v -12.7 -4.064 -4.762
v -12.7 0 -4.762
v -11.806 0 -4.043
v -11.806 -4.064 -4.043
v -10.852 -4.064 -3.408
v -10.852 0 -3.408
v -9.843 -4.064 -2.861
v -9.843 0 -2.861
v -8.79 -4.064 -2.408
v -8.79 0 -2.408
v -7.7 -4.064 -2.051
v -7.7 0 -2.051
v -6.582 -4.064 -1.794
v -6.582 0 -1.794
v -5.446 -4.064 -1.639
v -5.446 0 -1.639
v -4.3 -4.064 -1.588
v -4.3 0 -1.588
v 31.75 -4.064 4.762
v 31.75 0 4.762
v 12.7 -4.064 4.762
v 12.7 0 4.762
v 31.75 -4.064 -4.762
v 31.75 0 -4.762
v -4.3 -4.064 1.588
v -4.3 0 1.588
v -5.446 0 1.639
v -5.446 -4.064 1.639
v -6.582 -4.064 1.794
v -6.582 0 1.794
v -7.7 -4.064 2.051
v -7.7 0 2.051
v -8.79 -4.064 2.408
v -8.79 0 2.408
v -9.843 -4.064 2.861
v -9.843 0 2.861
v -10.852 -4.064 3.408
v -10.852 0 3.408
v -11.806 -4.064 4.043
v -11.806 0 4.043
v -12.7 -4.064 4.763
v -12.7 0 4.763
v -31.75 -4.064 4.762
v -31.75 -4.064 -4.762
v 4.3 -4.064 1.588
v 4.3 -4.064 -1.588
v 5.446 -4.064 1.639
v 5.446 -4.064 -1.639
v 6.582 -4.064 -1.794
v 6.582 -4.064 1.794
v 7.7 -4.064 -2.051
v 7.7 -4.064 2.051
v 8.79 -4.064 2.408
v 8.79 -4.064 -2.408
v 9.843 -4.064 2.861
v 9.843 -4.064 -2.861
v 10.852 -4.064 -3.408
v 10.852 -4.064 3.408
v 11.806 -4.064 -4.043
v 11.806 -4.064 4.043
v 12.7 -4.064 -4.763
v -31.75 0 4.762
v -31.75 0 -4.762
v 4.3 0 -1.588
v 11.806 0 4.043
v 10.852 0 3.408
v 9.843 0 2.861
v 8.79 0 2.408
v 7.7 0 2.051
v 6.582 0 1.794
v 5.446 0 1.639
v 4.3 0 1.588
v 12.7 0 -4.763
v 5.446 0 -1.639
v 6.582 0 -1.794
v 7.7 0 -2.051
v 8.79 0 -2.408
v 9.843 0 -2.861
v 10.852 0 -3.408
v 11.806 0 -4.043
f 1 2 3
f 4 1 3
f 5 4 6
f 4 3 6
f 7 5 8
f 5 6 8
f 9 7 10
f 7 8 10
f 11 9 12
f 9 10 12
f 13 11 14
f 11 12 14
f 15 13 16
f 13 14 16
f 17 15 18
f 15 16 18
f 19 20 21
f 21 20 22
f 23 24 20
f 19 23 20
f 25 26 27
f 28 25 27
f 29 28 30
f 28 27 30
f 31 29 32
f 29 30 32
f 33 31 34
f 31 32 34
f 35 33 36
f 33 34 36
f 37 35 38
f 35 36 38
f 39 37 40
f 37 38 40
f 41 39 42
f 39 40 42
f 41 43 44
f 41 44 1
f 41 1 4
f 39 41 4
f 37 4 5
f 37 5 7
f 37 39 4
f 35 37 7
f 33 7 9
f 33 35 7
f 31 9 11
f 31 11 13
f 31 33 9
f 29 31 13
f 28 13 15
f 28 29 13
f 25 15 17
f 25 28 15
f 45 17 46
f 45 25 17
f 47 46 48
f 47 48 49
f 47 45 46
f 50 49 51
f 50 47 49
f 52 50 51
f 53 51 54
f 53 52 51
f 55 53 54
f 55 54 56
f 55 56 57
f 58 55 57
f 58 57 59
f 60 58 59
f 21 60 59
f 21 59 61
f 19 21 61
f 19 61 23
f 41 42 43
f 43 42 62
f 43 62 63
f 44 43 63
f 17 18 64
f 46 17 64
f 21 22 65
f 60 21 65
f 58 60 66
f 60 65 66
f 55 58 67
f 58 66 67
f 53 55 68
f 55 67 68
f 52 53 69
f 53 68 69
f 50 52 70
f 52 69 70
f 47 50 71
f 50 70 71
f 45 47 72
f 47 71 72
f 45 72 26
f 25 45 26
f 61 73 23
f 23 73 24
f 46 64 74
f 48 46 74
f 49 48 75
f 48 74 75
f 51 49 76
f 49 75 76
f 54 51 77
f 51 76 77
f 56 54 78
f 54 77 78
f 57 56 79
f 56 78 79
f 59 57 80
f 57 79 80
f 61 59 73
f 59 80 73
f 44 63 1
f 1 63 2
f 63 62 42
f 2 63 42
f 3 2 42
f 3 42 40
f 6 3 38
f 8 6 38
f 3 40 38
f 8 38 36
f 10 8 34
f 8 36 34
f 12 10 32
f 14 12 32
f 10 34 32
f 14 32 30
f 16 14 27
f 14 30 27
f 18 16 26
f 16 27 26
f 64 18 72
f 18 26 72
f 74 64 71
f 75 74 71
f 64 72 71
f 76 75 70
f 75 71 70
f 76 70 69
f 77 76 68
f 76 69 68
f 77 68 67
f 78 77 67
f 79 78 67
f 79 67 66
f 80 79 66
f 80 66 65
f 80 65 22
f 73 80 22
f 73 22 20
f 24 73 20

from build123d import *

# Parameters (mm, degrees)
F1_DEPTH = 4.064


with BuildPart() as f1:
    # F0 (on Front) → F1 (new body)
    with BuildSketch(Plane.XZ):
        with BuildLine():
            Line((4.29974, 1.5875), (0, 1.5875))
            Line((0, 1.5875), (-4.29974, 1.5875))
            ThreePointArc((-4.29974, 1.5875), (-8.789868, 2.407738), (-12.7, 4.7625))
            Line((-12.7, 4.7625), (-31.75, 4.7625))
            Line((-31.75, 4.7625), (-31.75, 0))
            Line((-31.75, 0), (-31.75, -4.7625))
            Line((-31.75, -4.7625), (-12.7, -4.7625))
            ThreePointArc((-12.7, -4.7625), (-8.789868, -2.407738), (-4.29974, -1.5875))
            Line((-4.29974, -1.5875), (0, -1.5875))
            Line((0, -1.5875), (4.29974, -1.5875))
            ThreePointArc((4.29974, -1.5875), (8.789868, -2.407738), (12.7, -4.7625))
            Line((12.7, -4.7625), (31.75, -4.7625))
            Line((31.75, -4.7625), (31.75, 0))
            Line((31.75, 0), (31.75, 4.7625))
            Line((31.75, 4.7625), (12.7, 4.7625))
            ThreePointArc((12.7, 4.7625), (8.789868, 2.407738), (4.29974, 1.5875))
        make_face()
    extrude(amount=F1_DEPTH)


solid = f1.part
